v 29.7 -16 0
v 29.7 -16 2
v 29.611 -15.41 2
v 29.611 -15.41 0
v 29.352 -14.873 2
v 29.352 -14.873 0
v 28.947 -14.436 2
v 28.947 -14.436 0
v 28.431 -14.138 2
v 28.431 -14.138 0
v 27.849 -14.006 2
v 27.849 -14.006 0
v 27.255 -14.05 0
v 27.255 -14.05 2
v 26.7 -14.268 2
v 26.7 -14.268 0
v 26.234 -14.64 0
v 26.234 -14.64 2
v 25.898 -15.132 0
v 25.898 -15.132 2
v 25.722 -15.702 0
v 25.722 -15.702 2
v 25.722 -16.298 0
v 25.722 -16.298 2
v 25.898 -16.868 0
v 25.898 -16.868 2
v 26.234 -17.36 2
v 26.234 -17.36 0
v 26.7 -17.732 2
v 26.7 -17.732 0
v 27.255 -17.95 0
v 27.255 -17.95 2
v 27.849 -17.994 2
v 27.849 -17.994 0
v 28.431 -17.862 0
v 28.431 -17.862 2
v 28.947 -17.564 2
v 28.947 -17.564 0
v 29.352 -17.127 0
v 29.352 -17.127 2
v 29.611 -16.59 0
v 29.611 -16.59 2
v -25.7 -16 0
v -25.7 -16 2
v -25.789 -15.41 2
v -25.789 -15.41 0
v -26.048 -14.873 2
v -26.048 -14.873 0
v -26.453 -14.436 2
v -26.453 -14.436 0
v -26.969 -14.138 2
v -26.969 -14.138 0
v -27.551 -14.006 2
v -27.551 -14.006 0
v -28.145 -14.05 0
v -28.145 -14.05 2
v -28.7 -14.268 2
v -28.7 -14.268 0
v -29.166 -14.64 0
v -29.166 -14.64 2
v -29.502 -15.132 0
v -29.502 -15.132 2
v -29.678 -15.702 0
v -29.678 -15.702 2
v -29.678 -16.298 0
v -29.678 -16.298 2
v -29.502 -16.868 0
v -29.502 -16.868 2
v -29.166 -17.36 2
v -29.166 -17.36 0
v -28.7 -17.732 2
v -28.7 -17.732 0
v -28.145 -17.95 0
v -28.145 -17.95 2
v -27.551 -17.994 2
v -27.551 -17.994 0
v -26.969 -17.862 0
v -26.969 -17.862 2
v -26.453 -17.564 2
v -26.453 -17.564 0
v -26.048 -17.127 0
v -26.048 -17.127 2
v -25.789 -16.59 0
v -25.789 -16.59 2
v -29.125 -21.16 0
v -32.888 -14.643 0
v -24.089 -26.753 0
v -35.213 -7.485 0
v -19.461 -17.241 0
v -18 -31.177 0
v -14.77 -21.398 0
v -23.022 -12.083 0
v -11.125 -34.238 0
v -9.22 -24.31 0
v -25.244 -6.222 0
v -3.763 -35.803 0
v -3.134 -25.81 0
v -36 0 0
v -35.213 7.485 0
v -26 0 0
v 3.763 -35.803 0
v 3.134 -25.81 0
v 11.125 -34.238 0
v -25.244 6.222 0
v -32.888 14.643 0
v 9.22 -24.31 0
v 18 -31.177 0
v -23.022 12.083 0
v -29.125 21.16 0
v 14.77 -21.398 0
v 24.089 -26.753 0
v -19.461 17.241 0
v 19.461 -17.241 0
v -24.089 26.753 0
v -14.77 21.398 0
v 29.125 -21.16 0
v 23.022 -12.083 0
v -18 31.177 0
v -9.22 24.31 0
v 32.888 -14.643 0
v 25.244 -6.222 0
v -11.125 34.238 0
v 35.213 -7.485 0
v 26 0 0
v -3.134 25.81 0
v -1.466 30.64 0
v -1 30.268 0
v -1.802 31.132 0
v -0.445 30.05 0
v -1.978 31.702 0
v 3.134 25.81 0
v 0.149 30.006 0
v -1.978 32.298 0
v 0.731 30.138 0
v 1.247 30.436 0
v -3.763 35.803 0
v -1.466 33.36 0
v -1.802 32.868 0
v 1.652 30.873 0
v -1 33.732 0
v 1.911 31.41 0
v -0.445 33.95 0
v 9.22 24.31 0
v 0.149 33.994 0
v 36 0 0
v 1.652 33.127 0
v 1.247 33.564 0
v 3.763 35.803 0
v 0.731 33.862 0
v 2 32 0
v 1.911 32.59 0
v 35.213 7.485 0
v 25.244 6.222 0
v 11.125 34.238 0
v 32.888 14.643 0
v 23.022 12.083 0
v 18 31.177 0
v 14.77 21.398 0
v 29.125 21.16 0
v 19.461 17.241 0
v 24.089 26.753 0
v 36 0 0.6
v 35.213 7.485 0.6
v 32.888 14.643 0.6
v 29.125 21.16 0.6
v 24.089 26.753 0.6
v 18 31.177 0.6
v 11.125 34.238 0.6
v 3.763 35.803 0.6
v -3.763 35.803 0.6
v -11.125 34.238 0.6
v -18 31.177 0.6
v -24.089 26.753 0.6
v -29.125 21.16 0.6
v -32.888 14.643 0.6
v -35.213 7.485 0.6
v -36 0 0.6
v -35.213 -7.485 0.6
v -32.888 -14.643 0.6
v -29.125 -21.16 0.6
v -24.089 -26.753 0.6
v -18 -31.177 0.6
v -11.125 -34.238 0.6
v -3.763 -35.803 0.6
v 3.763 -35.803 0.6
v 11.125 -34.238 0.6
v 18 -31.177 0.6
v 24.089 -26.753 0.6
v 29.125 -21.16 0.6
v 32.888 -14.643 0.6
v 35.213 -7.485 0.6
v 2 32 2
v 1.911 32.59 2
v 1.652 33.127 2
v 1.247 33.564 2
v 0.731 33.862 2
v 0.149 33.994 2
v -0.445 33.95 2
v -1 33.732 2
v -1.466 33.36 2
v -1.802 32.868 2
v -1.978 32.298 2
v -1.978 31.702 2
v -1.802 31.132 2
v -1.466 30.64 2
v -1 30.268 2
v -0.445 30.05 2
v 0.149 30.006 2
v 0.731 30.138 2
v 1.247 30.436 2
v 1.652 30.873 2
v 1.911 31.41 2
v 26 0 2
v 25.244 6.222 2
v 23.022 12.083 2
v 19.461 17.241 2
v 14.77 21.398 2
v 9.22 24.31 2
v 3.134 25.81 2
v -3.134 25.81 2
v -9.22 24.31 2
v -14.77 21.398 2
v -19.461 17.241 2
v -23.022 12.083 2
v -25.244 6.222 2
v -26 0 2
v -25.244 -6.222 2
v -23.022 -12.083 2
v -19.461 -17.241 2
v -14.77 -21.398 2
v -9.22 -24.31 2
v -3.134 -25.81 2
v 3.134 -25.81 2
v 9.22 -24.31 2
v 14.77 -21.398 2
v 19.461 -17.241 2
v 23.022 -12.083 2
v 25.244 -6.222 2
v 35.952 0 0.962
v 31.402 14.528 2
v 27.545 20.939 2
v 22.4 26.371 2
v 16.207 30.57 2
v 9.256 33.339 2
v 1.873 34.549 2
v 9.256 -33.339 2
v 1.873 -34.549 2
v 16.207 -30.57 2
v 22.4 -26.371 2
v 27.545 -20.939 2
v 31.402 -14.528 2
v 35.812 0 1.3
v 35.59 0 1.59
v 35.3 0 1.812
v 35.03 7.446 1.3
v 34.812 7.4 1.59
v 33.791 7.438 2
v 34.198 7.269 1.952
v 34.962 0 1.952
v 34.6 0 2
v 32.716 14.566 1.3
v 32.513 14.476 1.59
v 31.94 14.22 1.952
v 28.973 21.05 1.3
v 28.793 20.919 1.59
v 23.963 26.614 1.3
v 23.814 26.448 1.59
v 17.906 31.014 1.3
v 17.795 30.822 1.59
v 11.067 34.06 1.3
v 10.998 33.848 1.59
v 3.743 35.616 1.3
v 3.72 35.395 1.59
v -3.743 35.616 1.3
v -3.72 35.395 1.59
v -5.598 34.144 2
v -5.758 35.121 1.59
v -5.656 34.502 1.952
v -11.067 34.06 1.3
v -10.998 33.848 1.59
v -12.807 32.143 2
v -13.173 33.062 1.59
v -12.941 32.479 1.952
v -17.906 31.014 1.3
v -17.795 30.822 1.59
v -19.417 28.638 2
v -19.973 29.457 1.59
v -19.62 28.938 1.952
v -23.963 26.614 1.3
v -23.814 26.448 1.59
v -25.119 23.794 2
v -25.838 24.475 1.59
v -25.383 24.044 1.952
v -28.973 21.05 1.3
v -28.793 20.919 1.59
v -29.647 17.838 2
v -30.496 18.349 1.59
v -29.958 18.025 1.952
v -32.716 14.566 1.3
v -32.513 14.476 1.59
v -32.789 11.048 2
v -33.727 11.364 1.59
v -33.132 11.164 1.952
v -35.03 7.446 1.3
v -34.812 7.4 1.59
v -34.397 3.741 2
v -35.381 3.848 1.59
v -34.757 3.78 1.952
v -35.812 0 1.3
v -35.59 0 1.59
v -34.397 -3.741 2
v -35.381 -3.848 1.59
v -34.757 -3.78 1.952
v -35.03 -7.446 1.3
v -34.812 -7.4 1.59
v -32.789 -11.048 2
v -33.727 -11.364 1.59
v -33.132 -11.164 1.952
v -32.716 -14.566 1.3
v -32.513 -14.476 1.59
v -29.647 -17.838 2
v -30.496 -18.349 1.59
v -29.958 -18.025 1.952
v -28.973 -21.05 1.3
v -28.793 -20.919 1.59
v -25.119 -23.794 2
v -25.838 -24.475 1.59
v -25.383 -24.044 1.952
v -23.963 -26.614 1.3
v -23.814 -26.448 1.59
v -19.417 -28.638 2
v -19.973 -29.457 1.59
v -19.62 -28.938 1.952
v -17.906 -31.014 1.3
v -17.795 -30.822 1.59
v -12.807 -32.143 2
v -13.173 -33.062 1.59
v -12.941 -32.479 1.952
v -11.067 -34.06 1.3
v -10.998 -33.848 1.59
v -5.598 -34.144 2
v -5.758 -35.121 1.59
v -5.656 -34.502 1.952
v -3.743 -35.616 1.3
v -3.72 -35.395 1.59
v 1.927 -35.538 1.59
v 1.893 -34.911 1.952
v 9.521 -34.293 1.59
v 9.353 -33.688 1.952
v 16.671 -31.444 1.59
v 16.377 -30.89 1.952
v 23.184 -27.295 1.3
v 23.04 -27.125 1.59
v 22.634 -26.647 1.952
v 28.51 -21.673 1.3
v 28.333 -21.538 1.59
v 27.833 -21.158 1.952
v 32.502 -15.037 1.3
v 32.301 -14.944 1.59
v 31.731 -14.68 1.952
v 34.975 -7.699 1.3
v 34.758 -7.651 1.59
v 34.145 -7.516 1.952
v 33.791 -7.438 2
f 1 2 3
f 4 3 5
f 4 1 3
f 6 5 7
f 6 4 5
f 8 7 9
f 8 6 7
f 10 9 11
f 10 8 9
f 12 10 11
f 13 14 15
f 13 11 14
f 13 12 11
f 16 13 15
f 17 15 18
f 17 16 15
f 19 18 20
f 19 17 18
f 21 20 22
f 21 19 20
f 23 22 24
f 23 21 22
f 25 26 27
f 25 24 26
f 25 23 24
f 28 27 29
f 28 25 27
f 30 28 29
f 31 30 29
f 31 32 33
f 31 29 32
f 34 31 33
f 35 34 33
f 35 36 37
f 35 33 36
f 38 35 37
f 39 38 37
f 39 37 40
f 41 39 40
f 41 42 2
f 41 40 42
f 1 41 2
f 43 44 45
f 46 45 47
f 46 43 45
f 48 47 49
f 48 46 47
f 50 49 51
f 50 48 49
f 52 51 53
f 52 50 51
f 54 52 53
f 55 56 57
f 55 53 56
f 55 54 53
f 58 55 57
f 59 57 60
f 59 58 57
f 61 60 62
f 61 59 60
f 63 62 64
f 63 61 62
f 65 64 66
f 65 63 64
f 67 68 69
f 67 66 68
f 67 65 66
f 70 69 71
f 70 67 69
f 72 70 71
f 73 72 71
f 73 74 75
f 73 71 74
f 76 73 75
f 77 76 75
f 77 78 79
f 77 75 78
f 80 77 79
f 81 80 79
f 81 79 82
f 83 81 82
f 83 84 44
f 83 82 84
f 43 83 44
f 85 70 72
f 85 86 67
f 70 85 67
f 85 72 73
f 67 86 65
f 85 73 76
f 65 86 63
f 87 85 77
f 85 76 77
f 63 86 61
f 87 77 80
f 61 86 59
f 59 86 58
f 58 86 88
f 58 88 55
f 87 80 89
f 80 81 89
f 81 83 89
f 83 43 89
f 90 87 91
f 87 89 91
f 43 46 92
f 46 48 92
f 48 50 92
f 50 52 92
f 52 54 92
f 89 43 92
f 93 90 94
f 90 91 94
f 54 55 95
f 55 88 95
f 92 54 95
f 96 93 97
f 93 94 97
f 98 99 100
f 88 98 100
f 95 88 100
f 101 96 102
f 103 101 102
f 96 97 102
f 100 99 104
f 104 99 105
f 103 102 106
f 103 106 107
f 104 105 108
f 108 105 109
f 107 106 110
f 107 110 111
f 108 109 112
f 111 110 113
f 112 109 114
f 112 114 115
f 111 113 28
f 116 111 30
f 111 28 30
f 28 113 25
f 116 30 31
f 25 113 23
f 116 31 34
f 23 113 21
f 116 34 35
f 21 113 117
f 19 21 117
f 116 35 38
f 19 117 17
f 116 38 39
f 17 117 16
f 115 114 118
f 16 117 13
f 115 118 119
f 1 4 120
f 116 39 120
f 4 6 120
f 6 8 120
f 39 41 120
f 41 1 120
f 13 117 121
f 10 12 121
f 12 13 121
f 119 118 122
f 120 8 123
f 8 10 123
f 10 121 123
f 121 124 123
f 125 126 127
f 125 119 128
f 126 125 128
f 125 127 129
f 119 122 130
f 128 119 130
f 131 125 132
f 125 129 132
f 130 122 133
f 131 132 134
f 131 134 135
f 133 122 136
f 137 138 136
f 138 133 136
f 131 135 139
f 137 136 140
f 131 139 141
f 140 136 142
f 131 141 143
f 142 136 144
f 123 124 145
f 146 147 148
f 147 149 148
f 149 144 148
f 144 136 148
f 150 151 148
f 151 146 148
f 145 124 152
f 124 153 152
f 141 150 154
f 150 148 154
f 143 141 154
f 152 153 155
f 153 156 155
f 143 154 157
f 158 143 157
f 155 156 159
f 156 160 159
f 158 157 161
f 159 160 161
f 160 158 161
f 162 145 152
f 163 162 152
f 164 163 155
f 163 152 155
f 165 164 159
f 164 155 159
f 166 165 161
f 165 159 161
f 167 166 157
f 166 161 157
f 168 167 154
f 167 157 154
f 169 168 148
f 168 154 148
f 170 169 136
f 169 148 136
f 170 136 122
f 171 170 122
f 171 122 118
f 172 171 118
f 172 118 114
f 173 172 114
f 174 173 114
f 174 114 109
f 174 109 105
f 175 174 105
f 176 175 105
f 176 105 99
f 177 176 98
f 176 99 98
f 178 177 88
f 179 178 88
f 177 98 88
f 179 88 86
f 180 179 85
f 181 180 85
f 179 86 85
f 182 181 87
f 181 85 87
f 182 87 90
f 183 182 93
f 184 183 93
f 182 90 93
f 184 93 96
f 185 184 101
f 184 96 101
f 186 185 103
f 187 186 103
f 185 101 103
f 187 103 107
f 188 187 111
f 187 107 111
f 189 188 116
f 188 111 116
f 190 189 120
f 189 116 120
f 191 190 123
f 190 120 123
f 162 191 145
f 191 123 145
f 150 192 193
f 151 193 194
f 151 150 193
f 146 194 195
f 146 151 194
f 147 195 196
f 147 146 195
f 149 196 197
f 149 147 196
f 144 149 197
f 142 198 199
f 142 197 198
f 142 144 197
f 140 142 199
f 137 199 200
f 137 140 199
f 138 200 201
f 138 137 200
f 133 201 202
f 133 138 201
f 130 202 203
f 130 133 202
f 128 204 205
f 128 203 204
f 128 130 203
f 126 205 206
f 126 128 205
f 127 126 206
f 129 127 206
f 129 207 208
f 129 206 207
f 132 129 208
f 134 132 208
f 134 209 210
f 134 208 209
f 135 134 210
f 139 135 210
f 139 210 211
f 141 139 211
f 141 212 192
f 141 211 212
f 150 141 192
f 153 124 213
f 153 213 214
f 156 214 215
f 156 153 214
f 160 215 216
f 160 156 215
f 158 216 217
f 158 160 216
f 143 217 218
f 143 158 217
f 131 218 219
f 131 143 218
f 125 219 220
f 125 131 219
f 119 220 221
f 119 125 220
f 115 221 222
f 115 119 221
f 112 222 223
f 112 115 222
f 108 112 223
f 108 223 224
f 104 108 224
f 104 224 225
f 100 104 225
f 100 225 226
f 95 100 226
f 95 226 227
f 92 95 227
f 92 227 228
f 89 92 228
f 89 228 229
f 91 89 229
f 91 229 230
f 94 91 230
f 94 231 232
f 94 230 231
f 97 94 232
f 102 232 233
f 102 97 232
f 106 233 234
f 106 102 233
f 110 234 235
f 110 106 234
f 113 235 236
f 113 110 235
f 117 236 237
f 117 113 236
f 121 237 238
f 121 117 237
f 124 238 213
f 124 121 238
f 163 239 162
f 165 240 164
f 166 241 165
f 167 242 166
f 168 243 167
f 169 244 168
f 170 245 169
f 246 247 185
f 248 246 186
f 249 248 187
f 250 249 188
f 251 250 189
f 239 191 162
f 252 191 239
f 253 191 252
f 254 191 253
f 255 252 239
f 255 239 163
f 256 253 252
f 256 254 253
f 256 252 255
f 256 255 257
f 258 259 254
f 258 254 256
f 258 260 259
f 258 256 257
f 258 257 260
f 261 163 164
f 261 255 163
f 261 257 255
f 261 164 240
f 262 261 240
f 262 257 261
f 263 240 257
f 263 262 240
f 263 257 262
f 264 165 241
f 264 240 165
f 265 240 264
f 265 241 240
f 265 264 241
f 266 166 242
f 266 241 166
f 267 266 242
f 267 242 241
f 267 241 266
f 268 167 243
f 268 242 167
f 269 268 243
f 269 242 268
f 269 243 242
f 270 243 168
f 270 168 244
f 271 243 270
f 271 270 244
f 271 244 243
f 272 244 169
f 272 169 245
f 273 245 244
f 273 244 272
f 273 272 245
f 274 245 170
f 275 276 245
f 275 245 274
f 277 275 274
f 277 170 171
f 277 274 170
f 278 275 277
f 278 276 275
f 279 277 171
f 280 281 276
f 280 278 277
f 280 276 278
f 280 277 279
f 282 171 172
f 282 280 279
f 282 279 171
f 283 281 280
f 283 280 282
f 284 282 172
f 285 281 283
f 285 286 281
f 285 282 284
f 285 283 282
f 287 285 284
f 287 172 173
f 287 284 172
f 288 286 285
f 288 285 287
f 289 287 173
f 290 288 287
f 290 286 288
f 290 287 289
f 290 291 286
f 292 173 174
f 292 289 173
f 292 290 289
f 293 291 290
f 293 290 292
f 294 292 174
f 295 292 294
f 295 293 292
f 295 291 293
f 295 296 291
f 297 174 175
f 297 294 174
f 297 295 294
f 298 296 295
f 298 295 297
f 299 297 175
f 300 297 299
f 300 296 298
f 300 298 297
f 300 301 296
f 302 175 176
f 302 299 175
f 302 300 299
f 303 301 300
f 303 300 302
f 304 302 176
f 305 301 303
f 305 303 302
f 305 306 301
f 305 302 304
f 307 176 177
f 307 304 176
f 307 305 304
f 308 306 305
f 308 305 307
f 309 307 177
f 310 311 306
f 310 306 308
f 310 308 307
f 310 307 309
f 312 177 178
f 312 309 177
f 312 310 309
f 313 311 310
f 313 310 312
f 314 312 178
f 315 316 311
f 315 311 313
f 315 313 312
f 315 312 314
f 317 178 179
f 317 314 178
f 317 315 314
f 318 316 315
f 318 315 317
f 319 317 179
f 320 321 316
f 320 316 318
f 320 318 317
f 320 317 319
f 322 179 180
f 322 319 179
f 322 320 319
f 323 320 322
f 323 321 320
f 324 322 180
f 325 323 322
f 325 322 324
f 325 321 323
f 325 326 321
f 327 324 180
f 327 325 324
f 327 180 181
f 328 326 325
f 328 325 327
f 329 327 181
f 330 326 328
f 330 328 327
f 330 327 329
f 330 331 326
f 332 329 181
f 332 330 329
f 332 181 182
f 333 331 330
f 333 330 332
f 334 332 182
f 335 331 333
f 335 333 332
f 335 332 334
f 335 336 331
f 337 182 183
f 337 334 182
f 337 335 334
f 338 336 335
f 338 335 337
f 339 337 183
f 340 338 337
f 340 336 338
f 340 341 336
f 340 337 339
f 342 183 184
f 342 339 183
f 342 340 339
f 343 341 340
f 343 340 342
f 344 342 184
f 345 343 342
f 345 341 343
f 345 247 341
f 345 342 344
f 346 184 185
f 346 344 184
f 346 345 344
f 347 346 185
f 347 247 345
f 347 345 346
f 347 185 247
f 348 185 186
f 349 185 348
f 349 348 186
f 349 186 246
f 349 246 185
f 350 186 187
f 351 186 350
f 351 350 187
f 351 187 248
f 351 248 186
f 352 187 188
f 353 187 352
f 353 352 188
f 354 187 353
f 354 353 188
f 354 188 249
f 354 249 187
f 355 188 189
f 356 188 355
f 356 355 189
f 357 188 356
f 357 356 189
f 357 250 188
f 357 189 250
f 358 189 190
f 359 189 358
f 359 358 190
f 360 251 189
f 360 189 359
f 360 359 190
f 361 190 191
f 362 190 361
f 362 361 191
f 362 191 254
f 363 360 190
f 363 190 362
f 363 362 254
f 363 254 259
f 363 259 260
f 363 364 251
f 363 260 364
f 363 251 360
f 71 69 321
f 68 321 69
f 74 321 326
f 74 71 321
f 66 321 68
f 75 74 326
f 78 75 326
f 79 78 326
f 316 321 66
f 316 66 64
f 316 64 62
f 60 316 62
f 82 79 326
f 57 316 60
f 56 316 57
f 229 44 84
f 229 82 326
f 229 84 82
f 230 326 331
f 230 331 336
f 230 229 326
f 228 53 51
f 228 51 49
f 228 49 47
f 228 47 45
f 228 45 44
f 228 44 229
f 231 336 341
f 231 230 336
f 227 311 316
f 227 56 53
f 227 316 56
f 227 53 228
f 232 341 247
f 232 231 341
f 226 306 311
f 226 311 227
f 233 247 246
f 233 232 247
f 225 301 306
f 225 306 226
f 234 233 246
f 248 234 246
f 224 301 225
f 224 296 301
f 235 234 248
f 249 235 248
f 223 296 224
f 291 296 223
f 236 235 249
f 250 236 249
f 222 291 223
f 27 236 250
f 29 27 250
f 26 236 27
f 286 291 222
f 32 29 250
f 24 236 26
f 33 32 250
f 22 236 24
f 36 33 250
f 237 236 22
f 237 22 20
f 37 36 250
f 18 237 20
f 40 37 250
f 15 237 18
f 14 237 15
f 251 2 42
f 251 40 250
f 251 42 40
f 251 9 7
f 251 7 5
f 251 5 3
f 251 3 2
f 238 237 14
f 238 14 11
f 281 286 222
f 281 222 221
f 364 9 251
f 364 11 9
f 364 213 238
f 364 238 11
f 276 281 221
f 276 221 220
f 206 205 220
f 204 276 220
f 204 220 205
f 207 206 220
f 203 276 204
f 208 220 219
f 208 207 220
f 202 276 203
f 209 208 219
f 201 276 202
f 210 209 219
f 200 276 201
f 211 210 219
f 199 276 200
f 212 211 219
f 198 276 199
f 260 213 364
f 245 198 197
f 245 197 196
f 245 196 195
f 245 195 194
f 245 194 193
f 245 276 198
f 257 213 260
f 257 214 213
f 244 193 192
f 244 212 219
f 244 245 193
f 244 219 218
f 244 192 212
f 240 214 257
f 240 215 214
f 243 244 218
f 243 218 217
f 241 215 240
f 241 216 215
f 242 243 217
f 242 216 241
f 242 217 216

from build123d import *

# Parameters (mm, degrees)
CYLINDER005_R     = 2
CYLINDER005_DEPTH = 10
CYLINDER006_R     = 2
CYLINDER006_DEPTH = 10
CYLINDER007_R     = 2
CYLINDER007_DEPTH = 10
CYLINDER001_R     = 26
CYLINDER001_DEPTH = 10
CYLINDER_R        = 36
CYLINDER_DEPTH    = 2
FILLET_R          = 1.4


with BuildPart() as cylinder005:
    # Cylinder005 → Cylinder005 (new body)
    with BuildSketch(Plane(origin=(0, 32, 0), x_dir=(1, 0, 0), z_dir=(0, 0, 1))):
        Circle(CYLINDER005_R)
    extrude(amount=CYLINDER005_DEPTH)


with BuildPart() as cylinder006:
    # Cylinder006 → Cylinder006 (new body)
    with BuildSketch(Plane(origin=(-27.7, -16, 0), x_dir=(1, 0, 0), z_dir=(0, 0, 1))):
        Circle(CYLINDER006_R)
    extrude(amount=CYLINDER006_DEPTH)


with BuildPart() as fusion:
    # Cylinder007 → Cylinder007 (new body)
    with BuildSketch(Plane(origin=(27.7, -16, 0), x_dir=(1, 0, 0), z_dir=(0, 0, 1))):
        Circle(CYLINDER007_R)
    extrude(amount=CYLINDER007_DEPTH)

    # Fusion: union Cylinder005, Cylinder006
    add(cylinder005.part)
    add(cylinder006.part)


with BuildPart() as cylinder001:
    # Cylinder001 → Cylinder001 (new body)
    with BuildSketch(Plane.XY):
        Circle(CYLINDER001_R)
    extrude(amount=CYLINDER001_DEPTH)


with BuildPart() as f_2in_ring:
    # Cylinder → Cylinder (new body)
    with BuildSketch(Plane.XY):
        Circle(CYLINDER_R)
    extrude(amount=CYLINDER_DEPTH)

    # Cut: cut Cylinder001
    add(cylinder001.part, mode=Mode.SUBTRACT)

    # Cut001: cut Fusion
    add(fusion.part, mode=Mode.SUBTRACT)

    # Fillet
    fillet_edges = [f_2in_ring.edges().sort_by_distance(p)[0] for p in [
        (-36, 0, 2),
    ]]
    fillet(fillet_edges, radius=FILLET_R)


solid = f_2in_ring.part
